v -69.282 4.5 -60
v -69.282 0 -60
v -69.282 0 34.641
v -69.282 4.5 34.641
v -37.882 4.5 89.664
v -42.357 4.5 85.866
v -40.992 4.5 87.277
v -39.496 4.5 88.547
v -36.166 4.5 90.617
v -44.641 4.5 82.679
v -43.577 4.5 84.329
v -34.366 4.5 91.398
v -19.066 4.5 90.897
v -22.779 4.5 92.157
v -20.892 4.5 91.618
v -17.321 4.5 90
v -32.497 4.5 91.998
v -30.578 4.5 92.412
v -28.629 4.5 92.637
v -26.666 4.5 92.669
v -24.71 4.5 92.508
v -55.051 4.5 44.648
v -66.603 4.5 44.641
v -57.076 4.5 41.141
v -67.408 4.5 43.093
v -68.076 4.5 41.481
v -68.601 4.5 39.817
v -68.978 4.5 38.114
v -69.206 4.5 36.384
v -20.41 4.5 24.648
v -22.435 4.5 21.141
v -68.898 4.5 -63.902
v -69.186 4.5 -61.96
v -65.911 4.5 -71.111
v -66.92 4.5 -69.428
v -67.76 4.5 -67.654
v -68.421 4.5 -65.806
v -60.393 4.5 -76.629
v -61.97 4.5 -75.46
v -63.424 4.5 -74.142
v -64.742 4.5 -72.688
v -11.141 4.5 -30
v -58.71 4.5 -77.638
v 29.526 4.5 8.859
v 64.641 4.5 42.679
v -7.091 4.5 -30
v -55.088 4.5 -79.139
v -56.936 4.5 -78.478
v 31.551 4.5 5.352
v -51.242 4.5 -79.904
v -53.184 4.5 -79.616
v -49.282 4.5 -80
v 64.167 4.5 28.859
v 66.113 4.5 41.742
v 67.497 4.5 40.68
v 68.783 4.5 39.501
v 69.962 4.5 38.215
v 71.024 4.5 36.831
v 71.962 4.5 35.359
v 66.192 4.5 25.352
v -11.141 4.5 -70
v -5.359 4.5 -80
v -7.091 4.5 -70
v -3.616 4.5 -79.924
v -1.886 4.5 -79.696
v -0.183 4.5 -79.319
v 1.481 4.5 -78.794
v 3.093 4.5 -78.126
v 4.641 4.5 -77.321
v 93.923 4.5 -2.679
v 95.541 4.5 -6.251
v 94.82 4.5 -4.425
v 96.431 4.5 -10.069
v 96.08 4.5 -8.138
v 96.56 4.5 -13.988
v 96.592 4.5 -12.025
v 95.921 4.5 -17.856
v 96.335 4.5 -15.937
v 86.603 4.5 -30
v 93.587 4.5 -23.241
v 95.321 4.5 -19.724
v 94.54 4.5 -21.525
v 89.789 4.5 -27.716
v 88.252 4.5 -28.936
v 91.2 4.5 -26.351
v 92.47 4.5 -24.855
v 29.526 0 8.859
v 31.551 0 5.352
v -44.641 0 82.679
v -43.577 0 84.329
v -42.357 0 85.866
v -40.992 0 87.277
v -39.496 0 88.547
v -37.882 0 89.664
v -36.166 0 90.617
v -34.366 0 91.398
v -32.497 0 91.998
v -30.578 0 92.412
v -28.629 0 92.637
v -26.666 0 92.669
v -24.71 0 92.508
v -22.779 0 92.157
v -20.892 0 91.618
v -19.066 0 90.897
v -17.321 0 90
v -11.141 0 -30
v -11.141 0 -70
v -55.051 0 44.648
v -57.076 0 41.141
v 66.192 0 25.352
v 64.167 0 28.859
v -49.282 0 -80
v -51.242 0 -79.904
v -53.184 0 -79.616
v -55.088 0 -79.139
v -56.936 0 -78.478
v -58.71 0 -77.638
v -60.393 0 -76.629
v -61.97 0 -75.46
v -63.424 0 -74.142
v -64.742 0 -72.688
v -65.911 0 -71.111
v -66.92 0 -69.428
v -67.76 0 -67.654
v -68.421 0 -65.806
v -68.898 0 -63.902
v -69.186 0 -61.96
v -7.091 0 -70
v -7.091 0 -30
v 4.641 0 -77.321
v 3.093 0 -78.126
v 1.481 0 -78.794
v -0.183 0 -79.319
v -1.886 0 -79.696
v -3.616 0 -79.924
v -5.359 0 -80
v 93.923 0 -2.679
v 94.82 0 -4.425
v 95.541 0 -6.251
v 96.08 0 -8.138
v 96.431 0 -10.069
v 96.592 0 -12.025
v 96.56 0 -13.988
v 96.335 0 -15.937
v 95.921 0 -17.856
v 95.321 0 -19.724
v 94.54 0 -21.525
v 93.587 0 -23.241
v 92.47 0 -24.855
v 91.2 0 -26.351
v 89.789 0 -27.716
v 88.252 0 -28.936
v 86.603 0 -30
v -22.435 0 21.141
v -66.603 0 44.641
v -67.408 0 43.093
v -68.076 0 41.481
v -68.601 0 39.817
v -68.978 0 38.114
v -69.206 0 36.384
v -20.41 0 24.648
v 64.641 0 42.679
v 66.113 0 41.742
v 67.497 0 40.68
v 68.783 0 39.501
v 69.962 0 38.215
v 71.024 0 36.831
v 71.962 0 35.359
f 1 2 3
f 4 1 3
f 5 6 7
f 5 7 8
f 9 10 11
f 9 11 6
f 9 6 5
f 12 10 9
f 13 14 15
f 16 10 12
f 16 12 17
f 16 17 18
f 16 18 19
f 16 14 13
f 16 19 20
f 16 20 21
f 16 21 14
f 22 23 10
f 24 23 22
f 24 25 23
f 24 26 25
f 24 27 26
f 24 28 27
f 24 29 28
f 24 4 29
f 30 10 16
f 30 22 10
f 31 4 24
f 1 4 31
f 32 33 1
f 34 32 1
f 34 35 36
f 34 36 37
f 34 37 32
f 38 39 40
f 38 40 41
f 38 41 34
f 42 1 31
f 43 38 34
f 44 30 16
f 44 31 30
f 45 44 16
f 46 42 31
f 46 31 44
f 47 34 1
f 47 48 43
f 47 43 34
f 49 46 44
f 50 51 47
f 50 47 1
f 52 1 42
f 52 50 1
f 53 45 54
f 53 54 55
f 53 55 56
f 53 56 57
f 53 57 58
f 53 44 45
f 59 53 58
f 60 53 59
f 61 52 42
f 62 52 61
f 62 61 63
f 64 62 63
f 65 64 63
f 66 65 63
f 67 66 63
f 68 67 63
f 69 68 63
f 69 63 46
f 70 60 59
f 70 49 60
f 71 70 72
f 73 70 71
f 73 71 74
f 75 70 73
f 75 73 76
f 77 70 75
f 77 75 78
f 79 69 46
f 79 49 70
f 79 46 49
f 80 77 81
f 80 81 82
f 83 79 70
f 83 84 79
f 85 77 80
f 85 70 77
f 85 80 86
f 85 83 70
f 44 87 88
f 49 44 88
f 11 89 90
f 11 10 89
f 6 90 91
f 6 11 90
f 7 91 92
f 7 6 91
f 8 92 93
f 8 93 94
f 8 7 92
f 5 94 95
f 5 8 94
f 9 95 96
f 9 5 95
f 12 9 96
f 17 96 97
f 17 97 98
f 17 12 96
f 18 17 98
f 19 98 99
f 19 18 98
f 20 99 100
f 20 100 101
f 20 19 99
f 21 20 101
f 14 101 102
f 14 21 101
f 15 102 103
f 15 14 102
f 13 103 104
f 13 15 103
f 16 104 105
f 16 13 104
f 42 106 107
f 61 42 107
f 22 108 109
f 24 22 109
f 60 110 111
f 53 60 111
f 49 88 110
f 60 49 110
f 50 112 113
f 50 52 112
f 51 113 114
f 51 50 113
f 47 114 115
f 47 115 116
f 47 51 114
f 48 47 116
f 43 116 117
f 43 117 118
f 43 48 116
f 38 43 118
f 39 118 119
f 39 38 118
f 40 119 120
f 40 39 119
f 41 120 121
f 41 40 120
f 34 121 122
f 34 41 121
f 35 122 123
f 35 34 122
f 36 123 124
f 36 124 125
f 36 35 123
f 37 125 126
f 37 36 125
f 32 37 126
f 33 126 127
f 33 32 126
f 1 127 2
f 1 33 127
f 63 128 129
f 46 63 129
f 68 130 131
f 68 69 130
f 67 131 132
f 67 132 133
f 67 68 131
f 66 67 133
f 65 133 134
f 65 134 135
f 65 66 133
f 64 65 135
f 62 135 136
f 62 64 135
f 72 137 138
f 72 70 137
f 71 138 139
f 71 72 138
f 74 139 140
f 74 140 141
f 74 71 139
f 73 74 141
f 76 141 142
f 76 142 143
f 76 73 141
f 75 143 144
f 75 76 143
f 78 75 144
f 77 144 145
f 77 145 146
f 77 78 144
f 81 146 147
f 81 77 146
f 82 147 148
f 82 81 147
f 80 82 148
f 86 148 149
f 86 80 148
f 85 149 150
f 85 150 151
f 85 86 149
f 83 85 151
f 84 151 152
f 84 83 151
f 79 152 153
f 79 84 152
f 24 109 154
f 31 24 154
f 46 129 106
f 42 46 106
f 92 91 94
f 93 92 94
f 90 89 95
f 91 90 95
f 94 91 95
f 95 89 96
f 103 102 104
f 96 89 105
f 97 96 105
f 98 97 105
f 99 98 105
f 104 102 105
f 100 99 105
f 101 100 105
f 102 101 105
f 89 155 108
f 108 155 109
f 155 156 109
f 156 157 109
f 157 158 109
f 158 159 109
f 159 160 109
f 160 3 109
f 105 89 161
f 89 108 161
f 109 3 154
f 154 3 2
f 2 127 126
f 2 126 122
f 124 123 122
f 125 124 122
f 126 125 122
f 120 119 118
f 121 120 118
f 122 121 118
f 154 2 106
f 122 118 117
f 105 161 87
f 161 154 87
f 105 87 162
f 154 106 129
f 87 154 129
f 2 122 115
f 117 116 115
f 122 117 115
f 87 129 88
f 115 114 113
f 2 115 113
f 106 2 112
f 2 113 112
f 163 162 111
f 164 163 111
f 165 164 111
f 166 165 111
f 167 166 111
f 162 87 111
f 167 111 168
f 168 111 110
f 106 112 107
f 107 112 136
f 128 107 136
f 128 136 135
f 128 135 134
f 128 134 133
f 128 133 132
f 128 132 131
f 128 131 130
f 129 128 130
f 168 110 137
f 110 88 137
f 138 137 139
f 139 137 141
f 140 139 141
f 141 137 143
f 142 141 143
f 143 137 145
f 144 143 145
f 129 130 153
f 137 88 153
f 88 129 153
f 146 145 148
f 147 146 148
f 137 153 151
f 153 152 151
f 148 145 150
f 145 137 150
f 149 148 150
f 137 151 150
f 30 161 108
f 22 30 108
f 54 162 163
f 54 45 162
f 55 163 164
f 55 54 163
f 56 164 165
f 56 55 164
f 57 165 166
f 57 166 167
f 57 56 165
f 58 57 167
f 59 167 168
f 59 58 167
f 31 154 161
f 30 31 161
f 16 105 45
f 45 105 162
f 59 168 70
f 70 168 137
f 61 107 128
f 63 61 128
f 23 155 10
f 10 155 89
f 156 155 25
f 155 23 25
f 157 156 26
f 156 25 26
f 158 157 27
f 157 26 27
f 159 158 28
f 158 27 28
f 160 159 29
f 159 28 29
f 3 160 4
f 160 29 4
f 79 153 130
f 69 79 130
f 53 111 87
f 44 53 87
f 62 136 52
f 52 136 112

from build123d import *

# Parameters (mm, degrees)
SKETCH1_W           = 4.05
SKETCH1_H           = 40
BOSS_EXTRUDE1_DEPTH = 4.5
FILLET1_R           = 20


with BuildPart() as part:
    # Sketch1 → Boss-Extrude1 (new body)
    with BuildSketch(Plane(origin=(0, 0, 0), x_dir=(1, 0, 0), z_dir=(0, 1, 0))):
        Polygon((103.923048454, 20), (0, 80), (-69.282032303, 80), (-69.282032303, -40), (-34.641016151, -100), (69.282032303, -40), align=None)
        with Locations((-9.116016151, 50)):
            Rectangle(SKETCH1_W, SKETCH1_H, mode=Mode.SUBTRACT)
        Polygon((29.526270189, -8.858999874), (31.551270189, -5.351596989), (66.192286341, -25.351596989), (64.167286341, -28.858999874), align=None, mode=Mode.SUBTRACT)
        Polygon((-22.435254038, -21.141000126), (-20.410254038, -24.648403011), (-55.051270189, -44.648403011), (-57.076270189, -41.141000126), align=None, mode=Mode.SUBTRACT)
    extrude(amount=BOSS_EXTRUDE1_DEPTH)

    # Fillet1
    fillet1_edges = [part.edges().sort_by_distance(p)[0] for p in [
        (-69.282032303, 2.25, -80),
        (103.923048454, 2.25, -20),
        (-34.641016151, 2.25, 100),
        (69.282032303, 2.25, 40),
        (0, 2.25, -80),
        (-69.282032303, 2.25, 40),
    ]]
    fillet(fillet1_edges, radius=FILLET1_R)


solid = part.part
